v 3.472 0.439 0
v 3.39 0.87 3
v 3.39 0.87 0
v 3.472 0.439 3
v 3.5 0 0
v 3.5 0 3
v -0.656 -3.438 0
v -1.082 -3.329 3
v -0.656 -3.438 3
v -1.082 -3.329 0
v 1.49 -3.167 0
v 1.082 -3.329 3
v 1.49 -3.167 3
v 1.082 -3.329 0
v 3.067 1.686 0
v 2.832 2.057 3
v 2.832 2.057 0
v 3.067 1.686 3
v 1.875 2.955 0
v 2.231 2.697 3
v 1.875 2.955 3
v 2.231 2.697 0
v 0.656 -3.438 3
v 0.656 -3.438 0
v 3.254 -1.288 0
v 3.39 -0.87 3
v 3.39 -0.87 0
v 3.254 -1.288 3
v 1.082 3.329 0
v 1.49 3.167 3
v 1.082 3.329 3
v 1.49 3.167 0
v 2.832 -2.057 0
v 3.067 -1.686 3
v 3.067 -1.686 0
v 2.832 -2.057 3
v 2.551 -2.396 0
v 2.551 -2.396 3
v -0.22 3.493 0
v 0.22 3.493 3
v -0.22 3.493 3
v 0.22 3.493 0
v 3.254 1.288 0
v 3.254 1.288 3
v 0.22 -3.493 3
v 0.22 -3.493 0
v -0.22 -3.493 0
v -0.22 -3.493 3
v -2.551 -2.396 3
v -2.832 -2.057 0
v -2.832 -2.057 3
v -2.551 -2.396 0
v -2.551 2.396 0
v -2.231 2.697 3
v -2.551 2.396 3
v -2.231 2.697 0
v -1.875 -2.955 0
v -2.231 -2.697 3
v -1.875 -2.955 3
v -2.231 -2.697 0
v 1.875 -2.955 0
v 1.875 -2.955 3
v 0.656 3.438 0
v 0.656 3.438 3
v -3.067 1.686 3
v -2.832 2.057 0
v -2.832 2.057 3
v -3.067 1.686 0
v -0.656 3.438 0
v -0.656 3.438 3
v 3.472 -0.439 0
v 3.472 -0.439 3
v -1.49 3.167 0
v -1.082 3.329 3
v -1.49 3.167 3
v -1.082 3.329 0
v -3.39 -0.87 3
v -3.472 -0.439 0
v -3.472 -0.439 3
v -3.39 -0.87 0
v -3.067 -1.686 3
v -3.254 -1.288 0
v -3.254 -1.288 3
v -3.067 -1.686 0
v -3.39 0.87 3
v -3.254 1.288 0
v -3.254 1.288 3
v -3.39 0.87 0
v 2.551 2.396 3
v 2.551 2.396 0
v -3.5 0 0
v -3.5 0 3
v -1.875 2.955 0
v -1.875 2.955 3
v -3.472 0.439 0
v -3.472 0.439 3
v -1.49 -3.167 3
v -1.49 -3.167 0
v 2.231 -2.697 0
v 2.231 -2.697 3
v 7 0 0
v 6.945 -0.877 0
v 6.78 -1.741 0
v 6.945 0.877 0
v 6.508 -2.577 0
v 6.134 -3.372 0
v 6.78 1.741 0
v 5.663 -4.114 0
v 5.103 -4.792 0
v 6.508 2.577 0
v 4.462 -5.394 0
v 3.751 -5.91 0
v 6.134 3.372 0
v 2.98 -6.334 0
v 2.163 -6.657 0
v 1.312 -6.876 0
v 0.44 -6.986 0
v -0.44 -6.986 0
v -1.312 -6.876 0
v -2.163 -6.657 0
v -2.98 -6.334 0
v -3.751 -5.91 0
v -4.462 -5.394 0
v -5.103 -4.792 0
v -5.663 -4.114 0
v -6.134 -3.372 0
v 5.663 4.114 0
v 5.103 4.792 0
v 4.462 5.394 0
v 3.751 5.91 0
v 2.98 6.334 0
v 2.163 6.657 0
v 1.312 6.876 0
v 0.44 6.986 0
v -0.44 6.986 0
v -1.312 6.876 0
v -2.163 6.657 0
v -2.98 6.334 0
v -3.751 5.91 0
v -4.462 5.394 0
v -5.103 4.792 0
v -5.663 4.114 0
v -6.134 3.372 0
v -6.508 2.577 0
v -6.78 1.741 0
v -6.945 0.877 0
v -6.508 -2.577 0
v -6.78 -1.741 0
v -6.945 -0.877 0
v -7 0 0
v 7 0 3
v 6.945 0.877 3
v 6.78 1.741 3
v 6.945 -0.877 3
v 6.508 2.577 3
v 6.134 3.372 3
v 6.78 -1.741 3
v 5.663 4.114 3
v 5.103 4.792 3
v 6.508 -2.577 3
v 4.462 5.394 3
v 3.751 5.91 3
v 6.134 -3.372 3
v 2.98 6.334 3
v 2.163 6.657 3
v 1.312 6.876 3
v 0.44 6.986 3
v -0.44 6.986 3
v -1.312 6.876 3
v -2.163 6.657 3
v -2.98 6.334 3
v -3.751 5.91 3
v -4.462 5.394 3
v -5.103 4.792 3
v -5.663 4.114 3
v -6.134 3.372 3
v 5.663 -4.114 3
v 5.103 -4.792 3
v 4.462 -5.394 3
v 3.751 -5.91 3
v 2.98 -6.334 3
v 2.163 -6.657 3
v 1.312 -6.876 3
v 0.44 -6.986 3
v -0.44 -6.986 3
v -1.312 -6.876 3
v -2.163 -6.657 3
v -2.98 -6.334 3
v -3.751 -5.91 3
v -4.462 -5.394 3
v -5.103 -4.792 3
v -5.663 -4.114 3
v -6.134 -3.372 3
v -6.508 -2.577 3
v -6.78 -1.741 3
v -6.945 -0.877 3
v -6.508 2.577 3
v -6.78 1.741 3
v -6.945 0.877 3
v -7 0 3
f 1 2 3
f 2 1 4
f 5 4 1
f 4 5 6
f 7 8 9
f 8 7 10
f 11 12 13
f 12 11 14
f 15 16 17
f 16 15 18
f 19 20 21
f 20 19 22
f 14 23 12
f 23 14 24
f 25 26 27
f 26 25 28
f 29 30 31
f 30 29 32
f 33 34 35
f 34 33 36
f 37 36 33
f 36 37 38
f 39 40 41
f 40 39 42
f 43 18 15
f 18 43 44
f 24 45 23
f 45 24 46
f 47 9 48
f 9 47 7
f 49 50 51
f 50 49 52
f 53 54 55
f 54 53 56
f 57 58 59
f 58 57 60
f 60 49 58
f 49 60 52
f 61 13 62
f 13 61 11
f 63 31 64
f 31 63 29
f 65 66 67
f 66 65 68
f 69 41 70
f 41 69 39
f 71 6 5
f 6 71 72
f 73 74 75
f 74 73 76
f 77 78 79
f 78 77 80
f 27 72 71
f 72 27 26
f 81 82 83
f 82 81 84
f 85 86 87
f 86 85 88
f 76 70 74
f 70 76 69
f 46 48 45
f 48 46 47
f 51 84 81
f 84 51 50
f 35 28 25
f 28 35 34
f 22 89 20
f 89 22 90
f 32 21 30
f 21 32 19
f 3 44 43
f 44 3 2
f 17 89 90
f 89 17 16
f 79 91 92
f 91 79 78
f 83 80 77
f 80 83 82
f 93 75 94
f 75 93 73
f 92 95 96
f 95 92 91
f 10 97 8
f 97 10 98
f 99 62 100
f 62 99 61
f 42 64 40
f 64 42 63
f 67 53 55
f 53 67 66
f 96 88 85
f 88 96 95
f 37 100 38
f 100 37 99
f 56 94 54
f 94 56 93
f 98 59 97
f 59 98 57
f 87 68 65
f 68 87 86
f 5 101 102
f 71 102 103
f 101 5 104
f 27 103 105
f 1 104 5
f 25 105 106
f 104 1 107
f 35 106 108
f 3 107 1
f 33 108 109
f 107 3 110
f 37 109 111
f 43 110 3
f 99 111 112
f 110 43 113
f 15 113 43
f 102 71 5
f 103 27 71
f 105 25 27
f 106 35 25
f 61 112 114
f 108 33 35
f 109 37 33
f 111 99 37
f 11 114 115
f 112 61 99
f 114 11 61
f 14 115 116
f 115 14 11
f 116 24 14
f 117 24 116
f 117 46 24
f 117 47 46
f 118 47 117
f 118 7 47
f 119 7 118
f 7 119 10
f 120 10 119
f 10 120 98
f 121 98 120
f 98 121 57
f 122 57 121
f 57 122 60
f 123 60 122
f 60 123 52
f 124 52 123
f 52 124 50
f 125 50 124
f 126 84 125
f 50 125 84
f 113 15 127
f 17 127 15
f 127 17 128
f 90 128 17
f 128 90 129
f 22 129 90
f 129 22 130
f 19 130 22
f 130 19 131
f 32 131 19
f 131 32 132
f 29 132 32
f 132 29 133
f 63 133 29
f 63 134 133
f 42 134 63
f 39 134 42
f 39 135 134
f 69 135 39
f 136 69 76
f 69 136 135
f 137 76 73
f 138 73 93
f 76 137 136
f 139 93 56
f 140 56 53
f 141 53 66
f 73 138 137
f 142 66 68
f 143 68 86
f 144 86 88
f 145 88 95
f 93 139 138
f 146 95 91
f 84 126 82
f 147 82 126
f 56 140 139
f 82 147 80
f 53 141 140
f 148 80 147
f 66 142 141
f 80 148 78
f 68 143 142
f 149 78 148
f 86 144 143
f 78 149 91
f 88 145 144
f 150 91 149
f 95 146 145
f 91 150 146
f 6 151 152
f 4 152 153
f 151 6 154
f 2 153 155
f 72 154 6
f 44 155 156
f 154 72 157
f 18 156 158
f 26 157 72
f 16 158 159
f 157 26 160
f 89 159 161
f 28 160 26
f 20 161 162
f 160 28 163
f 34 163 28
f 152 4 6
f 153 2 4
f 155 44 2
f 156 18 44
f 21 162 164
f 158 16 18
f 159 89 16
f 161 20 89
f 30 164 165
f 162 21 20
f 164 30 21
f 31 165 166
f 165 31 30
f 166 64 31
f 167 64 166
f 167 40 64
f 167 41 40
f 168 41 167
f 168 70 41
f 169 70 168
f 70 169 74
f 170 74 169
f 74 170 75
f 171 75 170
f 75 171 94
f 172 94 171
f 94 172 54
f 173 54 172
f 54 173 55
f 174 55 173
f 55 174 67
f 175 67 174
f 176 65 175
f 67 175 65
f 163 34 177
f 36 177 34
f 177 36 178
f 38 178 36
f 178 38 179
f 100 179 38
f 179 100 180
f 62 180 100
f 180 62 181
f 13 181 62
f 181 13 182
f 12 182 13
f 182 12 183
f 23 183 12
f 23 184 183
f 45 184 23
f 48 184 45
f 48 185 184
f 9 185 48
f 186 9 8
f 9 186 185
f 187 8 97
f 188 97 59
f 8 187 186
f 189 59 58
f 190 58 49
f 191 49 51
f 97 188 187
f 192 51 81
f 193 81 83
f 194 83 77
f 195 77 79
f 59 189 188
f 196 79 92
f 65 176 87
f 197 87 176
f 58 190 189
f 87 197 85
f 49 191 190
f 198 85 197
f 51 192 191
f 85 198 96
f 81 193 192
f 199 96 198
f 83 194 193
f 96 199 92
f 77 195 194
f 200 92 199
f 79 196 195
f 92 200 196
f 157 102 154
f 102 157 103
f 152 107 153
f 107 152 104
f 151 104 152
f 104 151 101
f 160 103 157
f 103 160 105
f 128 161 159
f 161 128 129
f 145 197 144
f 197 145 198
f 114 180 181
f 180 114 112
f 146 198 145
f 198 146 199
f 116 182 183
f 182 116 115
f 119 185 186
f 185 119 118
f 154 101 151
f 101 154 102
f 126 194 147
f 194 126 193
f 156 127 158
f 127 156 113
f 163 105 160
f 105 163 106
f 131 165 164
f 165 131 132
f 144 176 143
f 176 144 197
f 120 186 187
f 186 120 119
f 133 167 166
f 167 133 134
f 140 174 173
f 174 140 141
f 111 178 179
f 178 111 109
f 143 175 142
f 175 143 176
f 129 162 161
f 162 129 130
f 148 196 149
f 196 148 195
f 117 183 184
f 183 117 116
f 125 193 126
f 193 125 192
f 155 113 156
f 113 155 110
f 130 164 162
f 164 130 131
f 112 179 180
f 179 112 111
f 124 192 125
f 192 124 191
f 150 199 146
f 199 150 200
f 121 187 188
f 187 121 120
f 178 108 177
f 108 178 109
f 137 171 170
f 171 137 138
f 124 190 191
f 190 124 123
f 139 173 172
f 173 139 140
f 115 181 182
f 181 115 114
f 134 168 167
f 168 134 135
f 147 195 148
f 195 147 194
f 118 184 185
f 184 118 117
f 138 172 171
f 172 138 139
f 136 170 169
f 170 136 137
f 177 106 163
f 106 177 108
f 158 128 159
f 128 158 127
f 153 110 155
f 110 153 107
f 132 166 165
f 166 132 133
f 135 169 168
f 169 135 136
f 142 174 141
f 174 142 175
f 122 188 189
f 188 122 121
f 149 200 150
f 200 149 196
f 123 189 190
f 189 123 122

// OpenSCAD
$fn = 50;


difference() {
	union() {
		cylinder(h = 3, r = 7.0000000000);
	}
	union() {
		#translate(v = [0.0000000000, 0.0000000000, -100.0000000000]) {
			cylinder(h = 200, r = 3.2500000000);
		}
		#translate(v = [0.0000000000, 0.0000000000, -100.0000000000]) {
			cylinder(h = 200, r = 3.2500000000);
		}
		#translate(v = [0.0000000000, 0.0000000000, -100.0000000000]) {
			cylinder(h = 200, r = 3.2500000000);
		}
		#translate(v = [0.0000000000, 0.0000000000, -100.0000000000]) {
			cylinder(h = 200, r = 3.2500000000);
		}
		#cylinder(h = 3, r = 3.5000000000);
	}
}
